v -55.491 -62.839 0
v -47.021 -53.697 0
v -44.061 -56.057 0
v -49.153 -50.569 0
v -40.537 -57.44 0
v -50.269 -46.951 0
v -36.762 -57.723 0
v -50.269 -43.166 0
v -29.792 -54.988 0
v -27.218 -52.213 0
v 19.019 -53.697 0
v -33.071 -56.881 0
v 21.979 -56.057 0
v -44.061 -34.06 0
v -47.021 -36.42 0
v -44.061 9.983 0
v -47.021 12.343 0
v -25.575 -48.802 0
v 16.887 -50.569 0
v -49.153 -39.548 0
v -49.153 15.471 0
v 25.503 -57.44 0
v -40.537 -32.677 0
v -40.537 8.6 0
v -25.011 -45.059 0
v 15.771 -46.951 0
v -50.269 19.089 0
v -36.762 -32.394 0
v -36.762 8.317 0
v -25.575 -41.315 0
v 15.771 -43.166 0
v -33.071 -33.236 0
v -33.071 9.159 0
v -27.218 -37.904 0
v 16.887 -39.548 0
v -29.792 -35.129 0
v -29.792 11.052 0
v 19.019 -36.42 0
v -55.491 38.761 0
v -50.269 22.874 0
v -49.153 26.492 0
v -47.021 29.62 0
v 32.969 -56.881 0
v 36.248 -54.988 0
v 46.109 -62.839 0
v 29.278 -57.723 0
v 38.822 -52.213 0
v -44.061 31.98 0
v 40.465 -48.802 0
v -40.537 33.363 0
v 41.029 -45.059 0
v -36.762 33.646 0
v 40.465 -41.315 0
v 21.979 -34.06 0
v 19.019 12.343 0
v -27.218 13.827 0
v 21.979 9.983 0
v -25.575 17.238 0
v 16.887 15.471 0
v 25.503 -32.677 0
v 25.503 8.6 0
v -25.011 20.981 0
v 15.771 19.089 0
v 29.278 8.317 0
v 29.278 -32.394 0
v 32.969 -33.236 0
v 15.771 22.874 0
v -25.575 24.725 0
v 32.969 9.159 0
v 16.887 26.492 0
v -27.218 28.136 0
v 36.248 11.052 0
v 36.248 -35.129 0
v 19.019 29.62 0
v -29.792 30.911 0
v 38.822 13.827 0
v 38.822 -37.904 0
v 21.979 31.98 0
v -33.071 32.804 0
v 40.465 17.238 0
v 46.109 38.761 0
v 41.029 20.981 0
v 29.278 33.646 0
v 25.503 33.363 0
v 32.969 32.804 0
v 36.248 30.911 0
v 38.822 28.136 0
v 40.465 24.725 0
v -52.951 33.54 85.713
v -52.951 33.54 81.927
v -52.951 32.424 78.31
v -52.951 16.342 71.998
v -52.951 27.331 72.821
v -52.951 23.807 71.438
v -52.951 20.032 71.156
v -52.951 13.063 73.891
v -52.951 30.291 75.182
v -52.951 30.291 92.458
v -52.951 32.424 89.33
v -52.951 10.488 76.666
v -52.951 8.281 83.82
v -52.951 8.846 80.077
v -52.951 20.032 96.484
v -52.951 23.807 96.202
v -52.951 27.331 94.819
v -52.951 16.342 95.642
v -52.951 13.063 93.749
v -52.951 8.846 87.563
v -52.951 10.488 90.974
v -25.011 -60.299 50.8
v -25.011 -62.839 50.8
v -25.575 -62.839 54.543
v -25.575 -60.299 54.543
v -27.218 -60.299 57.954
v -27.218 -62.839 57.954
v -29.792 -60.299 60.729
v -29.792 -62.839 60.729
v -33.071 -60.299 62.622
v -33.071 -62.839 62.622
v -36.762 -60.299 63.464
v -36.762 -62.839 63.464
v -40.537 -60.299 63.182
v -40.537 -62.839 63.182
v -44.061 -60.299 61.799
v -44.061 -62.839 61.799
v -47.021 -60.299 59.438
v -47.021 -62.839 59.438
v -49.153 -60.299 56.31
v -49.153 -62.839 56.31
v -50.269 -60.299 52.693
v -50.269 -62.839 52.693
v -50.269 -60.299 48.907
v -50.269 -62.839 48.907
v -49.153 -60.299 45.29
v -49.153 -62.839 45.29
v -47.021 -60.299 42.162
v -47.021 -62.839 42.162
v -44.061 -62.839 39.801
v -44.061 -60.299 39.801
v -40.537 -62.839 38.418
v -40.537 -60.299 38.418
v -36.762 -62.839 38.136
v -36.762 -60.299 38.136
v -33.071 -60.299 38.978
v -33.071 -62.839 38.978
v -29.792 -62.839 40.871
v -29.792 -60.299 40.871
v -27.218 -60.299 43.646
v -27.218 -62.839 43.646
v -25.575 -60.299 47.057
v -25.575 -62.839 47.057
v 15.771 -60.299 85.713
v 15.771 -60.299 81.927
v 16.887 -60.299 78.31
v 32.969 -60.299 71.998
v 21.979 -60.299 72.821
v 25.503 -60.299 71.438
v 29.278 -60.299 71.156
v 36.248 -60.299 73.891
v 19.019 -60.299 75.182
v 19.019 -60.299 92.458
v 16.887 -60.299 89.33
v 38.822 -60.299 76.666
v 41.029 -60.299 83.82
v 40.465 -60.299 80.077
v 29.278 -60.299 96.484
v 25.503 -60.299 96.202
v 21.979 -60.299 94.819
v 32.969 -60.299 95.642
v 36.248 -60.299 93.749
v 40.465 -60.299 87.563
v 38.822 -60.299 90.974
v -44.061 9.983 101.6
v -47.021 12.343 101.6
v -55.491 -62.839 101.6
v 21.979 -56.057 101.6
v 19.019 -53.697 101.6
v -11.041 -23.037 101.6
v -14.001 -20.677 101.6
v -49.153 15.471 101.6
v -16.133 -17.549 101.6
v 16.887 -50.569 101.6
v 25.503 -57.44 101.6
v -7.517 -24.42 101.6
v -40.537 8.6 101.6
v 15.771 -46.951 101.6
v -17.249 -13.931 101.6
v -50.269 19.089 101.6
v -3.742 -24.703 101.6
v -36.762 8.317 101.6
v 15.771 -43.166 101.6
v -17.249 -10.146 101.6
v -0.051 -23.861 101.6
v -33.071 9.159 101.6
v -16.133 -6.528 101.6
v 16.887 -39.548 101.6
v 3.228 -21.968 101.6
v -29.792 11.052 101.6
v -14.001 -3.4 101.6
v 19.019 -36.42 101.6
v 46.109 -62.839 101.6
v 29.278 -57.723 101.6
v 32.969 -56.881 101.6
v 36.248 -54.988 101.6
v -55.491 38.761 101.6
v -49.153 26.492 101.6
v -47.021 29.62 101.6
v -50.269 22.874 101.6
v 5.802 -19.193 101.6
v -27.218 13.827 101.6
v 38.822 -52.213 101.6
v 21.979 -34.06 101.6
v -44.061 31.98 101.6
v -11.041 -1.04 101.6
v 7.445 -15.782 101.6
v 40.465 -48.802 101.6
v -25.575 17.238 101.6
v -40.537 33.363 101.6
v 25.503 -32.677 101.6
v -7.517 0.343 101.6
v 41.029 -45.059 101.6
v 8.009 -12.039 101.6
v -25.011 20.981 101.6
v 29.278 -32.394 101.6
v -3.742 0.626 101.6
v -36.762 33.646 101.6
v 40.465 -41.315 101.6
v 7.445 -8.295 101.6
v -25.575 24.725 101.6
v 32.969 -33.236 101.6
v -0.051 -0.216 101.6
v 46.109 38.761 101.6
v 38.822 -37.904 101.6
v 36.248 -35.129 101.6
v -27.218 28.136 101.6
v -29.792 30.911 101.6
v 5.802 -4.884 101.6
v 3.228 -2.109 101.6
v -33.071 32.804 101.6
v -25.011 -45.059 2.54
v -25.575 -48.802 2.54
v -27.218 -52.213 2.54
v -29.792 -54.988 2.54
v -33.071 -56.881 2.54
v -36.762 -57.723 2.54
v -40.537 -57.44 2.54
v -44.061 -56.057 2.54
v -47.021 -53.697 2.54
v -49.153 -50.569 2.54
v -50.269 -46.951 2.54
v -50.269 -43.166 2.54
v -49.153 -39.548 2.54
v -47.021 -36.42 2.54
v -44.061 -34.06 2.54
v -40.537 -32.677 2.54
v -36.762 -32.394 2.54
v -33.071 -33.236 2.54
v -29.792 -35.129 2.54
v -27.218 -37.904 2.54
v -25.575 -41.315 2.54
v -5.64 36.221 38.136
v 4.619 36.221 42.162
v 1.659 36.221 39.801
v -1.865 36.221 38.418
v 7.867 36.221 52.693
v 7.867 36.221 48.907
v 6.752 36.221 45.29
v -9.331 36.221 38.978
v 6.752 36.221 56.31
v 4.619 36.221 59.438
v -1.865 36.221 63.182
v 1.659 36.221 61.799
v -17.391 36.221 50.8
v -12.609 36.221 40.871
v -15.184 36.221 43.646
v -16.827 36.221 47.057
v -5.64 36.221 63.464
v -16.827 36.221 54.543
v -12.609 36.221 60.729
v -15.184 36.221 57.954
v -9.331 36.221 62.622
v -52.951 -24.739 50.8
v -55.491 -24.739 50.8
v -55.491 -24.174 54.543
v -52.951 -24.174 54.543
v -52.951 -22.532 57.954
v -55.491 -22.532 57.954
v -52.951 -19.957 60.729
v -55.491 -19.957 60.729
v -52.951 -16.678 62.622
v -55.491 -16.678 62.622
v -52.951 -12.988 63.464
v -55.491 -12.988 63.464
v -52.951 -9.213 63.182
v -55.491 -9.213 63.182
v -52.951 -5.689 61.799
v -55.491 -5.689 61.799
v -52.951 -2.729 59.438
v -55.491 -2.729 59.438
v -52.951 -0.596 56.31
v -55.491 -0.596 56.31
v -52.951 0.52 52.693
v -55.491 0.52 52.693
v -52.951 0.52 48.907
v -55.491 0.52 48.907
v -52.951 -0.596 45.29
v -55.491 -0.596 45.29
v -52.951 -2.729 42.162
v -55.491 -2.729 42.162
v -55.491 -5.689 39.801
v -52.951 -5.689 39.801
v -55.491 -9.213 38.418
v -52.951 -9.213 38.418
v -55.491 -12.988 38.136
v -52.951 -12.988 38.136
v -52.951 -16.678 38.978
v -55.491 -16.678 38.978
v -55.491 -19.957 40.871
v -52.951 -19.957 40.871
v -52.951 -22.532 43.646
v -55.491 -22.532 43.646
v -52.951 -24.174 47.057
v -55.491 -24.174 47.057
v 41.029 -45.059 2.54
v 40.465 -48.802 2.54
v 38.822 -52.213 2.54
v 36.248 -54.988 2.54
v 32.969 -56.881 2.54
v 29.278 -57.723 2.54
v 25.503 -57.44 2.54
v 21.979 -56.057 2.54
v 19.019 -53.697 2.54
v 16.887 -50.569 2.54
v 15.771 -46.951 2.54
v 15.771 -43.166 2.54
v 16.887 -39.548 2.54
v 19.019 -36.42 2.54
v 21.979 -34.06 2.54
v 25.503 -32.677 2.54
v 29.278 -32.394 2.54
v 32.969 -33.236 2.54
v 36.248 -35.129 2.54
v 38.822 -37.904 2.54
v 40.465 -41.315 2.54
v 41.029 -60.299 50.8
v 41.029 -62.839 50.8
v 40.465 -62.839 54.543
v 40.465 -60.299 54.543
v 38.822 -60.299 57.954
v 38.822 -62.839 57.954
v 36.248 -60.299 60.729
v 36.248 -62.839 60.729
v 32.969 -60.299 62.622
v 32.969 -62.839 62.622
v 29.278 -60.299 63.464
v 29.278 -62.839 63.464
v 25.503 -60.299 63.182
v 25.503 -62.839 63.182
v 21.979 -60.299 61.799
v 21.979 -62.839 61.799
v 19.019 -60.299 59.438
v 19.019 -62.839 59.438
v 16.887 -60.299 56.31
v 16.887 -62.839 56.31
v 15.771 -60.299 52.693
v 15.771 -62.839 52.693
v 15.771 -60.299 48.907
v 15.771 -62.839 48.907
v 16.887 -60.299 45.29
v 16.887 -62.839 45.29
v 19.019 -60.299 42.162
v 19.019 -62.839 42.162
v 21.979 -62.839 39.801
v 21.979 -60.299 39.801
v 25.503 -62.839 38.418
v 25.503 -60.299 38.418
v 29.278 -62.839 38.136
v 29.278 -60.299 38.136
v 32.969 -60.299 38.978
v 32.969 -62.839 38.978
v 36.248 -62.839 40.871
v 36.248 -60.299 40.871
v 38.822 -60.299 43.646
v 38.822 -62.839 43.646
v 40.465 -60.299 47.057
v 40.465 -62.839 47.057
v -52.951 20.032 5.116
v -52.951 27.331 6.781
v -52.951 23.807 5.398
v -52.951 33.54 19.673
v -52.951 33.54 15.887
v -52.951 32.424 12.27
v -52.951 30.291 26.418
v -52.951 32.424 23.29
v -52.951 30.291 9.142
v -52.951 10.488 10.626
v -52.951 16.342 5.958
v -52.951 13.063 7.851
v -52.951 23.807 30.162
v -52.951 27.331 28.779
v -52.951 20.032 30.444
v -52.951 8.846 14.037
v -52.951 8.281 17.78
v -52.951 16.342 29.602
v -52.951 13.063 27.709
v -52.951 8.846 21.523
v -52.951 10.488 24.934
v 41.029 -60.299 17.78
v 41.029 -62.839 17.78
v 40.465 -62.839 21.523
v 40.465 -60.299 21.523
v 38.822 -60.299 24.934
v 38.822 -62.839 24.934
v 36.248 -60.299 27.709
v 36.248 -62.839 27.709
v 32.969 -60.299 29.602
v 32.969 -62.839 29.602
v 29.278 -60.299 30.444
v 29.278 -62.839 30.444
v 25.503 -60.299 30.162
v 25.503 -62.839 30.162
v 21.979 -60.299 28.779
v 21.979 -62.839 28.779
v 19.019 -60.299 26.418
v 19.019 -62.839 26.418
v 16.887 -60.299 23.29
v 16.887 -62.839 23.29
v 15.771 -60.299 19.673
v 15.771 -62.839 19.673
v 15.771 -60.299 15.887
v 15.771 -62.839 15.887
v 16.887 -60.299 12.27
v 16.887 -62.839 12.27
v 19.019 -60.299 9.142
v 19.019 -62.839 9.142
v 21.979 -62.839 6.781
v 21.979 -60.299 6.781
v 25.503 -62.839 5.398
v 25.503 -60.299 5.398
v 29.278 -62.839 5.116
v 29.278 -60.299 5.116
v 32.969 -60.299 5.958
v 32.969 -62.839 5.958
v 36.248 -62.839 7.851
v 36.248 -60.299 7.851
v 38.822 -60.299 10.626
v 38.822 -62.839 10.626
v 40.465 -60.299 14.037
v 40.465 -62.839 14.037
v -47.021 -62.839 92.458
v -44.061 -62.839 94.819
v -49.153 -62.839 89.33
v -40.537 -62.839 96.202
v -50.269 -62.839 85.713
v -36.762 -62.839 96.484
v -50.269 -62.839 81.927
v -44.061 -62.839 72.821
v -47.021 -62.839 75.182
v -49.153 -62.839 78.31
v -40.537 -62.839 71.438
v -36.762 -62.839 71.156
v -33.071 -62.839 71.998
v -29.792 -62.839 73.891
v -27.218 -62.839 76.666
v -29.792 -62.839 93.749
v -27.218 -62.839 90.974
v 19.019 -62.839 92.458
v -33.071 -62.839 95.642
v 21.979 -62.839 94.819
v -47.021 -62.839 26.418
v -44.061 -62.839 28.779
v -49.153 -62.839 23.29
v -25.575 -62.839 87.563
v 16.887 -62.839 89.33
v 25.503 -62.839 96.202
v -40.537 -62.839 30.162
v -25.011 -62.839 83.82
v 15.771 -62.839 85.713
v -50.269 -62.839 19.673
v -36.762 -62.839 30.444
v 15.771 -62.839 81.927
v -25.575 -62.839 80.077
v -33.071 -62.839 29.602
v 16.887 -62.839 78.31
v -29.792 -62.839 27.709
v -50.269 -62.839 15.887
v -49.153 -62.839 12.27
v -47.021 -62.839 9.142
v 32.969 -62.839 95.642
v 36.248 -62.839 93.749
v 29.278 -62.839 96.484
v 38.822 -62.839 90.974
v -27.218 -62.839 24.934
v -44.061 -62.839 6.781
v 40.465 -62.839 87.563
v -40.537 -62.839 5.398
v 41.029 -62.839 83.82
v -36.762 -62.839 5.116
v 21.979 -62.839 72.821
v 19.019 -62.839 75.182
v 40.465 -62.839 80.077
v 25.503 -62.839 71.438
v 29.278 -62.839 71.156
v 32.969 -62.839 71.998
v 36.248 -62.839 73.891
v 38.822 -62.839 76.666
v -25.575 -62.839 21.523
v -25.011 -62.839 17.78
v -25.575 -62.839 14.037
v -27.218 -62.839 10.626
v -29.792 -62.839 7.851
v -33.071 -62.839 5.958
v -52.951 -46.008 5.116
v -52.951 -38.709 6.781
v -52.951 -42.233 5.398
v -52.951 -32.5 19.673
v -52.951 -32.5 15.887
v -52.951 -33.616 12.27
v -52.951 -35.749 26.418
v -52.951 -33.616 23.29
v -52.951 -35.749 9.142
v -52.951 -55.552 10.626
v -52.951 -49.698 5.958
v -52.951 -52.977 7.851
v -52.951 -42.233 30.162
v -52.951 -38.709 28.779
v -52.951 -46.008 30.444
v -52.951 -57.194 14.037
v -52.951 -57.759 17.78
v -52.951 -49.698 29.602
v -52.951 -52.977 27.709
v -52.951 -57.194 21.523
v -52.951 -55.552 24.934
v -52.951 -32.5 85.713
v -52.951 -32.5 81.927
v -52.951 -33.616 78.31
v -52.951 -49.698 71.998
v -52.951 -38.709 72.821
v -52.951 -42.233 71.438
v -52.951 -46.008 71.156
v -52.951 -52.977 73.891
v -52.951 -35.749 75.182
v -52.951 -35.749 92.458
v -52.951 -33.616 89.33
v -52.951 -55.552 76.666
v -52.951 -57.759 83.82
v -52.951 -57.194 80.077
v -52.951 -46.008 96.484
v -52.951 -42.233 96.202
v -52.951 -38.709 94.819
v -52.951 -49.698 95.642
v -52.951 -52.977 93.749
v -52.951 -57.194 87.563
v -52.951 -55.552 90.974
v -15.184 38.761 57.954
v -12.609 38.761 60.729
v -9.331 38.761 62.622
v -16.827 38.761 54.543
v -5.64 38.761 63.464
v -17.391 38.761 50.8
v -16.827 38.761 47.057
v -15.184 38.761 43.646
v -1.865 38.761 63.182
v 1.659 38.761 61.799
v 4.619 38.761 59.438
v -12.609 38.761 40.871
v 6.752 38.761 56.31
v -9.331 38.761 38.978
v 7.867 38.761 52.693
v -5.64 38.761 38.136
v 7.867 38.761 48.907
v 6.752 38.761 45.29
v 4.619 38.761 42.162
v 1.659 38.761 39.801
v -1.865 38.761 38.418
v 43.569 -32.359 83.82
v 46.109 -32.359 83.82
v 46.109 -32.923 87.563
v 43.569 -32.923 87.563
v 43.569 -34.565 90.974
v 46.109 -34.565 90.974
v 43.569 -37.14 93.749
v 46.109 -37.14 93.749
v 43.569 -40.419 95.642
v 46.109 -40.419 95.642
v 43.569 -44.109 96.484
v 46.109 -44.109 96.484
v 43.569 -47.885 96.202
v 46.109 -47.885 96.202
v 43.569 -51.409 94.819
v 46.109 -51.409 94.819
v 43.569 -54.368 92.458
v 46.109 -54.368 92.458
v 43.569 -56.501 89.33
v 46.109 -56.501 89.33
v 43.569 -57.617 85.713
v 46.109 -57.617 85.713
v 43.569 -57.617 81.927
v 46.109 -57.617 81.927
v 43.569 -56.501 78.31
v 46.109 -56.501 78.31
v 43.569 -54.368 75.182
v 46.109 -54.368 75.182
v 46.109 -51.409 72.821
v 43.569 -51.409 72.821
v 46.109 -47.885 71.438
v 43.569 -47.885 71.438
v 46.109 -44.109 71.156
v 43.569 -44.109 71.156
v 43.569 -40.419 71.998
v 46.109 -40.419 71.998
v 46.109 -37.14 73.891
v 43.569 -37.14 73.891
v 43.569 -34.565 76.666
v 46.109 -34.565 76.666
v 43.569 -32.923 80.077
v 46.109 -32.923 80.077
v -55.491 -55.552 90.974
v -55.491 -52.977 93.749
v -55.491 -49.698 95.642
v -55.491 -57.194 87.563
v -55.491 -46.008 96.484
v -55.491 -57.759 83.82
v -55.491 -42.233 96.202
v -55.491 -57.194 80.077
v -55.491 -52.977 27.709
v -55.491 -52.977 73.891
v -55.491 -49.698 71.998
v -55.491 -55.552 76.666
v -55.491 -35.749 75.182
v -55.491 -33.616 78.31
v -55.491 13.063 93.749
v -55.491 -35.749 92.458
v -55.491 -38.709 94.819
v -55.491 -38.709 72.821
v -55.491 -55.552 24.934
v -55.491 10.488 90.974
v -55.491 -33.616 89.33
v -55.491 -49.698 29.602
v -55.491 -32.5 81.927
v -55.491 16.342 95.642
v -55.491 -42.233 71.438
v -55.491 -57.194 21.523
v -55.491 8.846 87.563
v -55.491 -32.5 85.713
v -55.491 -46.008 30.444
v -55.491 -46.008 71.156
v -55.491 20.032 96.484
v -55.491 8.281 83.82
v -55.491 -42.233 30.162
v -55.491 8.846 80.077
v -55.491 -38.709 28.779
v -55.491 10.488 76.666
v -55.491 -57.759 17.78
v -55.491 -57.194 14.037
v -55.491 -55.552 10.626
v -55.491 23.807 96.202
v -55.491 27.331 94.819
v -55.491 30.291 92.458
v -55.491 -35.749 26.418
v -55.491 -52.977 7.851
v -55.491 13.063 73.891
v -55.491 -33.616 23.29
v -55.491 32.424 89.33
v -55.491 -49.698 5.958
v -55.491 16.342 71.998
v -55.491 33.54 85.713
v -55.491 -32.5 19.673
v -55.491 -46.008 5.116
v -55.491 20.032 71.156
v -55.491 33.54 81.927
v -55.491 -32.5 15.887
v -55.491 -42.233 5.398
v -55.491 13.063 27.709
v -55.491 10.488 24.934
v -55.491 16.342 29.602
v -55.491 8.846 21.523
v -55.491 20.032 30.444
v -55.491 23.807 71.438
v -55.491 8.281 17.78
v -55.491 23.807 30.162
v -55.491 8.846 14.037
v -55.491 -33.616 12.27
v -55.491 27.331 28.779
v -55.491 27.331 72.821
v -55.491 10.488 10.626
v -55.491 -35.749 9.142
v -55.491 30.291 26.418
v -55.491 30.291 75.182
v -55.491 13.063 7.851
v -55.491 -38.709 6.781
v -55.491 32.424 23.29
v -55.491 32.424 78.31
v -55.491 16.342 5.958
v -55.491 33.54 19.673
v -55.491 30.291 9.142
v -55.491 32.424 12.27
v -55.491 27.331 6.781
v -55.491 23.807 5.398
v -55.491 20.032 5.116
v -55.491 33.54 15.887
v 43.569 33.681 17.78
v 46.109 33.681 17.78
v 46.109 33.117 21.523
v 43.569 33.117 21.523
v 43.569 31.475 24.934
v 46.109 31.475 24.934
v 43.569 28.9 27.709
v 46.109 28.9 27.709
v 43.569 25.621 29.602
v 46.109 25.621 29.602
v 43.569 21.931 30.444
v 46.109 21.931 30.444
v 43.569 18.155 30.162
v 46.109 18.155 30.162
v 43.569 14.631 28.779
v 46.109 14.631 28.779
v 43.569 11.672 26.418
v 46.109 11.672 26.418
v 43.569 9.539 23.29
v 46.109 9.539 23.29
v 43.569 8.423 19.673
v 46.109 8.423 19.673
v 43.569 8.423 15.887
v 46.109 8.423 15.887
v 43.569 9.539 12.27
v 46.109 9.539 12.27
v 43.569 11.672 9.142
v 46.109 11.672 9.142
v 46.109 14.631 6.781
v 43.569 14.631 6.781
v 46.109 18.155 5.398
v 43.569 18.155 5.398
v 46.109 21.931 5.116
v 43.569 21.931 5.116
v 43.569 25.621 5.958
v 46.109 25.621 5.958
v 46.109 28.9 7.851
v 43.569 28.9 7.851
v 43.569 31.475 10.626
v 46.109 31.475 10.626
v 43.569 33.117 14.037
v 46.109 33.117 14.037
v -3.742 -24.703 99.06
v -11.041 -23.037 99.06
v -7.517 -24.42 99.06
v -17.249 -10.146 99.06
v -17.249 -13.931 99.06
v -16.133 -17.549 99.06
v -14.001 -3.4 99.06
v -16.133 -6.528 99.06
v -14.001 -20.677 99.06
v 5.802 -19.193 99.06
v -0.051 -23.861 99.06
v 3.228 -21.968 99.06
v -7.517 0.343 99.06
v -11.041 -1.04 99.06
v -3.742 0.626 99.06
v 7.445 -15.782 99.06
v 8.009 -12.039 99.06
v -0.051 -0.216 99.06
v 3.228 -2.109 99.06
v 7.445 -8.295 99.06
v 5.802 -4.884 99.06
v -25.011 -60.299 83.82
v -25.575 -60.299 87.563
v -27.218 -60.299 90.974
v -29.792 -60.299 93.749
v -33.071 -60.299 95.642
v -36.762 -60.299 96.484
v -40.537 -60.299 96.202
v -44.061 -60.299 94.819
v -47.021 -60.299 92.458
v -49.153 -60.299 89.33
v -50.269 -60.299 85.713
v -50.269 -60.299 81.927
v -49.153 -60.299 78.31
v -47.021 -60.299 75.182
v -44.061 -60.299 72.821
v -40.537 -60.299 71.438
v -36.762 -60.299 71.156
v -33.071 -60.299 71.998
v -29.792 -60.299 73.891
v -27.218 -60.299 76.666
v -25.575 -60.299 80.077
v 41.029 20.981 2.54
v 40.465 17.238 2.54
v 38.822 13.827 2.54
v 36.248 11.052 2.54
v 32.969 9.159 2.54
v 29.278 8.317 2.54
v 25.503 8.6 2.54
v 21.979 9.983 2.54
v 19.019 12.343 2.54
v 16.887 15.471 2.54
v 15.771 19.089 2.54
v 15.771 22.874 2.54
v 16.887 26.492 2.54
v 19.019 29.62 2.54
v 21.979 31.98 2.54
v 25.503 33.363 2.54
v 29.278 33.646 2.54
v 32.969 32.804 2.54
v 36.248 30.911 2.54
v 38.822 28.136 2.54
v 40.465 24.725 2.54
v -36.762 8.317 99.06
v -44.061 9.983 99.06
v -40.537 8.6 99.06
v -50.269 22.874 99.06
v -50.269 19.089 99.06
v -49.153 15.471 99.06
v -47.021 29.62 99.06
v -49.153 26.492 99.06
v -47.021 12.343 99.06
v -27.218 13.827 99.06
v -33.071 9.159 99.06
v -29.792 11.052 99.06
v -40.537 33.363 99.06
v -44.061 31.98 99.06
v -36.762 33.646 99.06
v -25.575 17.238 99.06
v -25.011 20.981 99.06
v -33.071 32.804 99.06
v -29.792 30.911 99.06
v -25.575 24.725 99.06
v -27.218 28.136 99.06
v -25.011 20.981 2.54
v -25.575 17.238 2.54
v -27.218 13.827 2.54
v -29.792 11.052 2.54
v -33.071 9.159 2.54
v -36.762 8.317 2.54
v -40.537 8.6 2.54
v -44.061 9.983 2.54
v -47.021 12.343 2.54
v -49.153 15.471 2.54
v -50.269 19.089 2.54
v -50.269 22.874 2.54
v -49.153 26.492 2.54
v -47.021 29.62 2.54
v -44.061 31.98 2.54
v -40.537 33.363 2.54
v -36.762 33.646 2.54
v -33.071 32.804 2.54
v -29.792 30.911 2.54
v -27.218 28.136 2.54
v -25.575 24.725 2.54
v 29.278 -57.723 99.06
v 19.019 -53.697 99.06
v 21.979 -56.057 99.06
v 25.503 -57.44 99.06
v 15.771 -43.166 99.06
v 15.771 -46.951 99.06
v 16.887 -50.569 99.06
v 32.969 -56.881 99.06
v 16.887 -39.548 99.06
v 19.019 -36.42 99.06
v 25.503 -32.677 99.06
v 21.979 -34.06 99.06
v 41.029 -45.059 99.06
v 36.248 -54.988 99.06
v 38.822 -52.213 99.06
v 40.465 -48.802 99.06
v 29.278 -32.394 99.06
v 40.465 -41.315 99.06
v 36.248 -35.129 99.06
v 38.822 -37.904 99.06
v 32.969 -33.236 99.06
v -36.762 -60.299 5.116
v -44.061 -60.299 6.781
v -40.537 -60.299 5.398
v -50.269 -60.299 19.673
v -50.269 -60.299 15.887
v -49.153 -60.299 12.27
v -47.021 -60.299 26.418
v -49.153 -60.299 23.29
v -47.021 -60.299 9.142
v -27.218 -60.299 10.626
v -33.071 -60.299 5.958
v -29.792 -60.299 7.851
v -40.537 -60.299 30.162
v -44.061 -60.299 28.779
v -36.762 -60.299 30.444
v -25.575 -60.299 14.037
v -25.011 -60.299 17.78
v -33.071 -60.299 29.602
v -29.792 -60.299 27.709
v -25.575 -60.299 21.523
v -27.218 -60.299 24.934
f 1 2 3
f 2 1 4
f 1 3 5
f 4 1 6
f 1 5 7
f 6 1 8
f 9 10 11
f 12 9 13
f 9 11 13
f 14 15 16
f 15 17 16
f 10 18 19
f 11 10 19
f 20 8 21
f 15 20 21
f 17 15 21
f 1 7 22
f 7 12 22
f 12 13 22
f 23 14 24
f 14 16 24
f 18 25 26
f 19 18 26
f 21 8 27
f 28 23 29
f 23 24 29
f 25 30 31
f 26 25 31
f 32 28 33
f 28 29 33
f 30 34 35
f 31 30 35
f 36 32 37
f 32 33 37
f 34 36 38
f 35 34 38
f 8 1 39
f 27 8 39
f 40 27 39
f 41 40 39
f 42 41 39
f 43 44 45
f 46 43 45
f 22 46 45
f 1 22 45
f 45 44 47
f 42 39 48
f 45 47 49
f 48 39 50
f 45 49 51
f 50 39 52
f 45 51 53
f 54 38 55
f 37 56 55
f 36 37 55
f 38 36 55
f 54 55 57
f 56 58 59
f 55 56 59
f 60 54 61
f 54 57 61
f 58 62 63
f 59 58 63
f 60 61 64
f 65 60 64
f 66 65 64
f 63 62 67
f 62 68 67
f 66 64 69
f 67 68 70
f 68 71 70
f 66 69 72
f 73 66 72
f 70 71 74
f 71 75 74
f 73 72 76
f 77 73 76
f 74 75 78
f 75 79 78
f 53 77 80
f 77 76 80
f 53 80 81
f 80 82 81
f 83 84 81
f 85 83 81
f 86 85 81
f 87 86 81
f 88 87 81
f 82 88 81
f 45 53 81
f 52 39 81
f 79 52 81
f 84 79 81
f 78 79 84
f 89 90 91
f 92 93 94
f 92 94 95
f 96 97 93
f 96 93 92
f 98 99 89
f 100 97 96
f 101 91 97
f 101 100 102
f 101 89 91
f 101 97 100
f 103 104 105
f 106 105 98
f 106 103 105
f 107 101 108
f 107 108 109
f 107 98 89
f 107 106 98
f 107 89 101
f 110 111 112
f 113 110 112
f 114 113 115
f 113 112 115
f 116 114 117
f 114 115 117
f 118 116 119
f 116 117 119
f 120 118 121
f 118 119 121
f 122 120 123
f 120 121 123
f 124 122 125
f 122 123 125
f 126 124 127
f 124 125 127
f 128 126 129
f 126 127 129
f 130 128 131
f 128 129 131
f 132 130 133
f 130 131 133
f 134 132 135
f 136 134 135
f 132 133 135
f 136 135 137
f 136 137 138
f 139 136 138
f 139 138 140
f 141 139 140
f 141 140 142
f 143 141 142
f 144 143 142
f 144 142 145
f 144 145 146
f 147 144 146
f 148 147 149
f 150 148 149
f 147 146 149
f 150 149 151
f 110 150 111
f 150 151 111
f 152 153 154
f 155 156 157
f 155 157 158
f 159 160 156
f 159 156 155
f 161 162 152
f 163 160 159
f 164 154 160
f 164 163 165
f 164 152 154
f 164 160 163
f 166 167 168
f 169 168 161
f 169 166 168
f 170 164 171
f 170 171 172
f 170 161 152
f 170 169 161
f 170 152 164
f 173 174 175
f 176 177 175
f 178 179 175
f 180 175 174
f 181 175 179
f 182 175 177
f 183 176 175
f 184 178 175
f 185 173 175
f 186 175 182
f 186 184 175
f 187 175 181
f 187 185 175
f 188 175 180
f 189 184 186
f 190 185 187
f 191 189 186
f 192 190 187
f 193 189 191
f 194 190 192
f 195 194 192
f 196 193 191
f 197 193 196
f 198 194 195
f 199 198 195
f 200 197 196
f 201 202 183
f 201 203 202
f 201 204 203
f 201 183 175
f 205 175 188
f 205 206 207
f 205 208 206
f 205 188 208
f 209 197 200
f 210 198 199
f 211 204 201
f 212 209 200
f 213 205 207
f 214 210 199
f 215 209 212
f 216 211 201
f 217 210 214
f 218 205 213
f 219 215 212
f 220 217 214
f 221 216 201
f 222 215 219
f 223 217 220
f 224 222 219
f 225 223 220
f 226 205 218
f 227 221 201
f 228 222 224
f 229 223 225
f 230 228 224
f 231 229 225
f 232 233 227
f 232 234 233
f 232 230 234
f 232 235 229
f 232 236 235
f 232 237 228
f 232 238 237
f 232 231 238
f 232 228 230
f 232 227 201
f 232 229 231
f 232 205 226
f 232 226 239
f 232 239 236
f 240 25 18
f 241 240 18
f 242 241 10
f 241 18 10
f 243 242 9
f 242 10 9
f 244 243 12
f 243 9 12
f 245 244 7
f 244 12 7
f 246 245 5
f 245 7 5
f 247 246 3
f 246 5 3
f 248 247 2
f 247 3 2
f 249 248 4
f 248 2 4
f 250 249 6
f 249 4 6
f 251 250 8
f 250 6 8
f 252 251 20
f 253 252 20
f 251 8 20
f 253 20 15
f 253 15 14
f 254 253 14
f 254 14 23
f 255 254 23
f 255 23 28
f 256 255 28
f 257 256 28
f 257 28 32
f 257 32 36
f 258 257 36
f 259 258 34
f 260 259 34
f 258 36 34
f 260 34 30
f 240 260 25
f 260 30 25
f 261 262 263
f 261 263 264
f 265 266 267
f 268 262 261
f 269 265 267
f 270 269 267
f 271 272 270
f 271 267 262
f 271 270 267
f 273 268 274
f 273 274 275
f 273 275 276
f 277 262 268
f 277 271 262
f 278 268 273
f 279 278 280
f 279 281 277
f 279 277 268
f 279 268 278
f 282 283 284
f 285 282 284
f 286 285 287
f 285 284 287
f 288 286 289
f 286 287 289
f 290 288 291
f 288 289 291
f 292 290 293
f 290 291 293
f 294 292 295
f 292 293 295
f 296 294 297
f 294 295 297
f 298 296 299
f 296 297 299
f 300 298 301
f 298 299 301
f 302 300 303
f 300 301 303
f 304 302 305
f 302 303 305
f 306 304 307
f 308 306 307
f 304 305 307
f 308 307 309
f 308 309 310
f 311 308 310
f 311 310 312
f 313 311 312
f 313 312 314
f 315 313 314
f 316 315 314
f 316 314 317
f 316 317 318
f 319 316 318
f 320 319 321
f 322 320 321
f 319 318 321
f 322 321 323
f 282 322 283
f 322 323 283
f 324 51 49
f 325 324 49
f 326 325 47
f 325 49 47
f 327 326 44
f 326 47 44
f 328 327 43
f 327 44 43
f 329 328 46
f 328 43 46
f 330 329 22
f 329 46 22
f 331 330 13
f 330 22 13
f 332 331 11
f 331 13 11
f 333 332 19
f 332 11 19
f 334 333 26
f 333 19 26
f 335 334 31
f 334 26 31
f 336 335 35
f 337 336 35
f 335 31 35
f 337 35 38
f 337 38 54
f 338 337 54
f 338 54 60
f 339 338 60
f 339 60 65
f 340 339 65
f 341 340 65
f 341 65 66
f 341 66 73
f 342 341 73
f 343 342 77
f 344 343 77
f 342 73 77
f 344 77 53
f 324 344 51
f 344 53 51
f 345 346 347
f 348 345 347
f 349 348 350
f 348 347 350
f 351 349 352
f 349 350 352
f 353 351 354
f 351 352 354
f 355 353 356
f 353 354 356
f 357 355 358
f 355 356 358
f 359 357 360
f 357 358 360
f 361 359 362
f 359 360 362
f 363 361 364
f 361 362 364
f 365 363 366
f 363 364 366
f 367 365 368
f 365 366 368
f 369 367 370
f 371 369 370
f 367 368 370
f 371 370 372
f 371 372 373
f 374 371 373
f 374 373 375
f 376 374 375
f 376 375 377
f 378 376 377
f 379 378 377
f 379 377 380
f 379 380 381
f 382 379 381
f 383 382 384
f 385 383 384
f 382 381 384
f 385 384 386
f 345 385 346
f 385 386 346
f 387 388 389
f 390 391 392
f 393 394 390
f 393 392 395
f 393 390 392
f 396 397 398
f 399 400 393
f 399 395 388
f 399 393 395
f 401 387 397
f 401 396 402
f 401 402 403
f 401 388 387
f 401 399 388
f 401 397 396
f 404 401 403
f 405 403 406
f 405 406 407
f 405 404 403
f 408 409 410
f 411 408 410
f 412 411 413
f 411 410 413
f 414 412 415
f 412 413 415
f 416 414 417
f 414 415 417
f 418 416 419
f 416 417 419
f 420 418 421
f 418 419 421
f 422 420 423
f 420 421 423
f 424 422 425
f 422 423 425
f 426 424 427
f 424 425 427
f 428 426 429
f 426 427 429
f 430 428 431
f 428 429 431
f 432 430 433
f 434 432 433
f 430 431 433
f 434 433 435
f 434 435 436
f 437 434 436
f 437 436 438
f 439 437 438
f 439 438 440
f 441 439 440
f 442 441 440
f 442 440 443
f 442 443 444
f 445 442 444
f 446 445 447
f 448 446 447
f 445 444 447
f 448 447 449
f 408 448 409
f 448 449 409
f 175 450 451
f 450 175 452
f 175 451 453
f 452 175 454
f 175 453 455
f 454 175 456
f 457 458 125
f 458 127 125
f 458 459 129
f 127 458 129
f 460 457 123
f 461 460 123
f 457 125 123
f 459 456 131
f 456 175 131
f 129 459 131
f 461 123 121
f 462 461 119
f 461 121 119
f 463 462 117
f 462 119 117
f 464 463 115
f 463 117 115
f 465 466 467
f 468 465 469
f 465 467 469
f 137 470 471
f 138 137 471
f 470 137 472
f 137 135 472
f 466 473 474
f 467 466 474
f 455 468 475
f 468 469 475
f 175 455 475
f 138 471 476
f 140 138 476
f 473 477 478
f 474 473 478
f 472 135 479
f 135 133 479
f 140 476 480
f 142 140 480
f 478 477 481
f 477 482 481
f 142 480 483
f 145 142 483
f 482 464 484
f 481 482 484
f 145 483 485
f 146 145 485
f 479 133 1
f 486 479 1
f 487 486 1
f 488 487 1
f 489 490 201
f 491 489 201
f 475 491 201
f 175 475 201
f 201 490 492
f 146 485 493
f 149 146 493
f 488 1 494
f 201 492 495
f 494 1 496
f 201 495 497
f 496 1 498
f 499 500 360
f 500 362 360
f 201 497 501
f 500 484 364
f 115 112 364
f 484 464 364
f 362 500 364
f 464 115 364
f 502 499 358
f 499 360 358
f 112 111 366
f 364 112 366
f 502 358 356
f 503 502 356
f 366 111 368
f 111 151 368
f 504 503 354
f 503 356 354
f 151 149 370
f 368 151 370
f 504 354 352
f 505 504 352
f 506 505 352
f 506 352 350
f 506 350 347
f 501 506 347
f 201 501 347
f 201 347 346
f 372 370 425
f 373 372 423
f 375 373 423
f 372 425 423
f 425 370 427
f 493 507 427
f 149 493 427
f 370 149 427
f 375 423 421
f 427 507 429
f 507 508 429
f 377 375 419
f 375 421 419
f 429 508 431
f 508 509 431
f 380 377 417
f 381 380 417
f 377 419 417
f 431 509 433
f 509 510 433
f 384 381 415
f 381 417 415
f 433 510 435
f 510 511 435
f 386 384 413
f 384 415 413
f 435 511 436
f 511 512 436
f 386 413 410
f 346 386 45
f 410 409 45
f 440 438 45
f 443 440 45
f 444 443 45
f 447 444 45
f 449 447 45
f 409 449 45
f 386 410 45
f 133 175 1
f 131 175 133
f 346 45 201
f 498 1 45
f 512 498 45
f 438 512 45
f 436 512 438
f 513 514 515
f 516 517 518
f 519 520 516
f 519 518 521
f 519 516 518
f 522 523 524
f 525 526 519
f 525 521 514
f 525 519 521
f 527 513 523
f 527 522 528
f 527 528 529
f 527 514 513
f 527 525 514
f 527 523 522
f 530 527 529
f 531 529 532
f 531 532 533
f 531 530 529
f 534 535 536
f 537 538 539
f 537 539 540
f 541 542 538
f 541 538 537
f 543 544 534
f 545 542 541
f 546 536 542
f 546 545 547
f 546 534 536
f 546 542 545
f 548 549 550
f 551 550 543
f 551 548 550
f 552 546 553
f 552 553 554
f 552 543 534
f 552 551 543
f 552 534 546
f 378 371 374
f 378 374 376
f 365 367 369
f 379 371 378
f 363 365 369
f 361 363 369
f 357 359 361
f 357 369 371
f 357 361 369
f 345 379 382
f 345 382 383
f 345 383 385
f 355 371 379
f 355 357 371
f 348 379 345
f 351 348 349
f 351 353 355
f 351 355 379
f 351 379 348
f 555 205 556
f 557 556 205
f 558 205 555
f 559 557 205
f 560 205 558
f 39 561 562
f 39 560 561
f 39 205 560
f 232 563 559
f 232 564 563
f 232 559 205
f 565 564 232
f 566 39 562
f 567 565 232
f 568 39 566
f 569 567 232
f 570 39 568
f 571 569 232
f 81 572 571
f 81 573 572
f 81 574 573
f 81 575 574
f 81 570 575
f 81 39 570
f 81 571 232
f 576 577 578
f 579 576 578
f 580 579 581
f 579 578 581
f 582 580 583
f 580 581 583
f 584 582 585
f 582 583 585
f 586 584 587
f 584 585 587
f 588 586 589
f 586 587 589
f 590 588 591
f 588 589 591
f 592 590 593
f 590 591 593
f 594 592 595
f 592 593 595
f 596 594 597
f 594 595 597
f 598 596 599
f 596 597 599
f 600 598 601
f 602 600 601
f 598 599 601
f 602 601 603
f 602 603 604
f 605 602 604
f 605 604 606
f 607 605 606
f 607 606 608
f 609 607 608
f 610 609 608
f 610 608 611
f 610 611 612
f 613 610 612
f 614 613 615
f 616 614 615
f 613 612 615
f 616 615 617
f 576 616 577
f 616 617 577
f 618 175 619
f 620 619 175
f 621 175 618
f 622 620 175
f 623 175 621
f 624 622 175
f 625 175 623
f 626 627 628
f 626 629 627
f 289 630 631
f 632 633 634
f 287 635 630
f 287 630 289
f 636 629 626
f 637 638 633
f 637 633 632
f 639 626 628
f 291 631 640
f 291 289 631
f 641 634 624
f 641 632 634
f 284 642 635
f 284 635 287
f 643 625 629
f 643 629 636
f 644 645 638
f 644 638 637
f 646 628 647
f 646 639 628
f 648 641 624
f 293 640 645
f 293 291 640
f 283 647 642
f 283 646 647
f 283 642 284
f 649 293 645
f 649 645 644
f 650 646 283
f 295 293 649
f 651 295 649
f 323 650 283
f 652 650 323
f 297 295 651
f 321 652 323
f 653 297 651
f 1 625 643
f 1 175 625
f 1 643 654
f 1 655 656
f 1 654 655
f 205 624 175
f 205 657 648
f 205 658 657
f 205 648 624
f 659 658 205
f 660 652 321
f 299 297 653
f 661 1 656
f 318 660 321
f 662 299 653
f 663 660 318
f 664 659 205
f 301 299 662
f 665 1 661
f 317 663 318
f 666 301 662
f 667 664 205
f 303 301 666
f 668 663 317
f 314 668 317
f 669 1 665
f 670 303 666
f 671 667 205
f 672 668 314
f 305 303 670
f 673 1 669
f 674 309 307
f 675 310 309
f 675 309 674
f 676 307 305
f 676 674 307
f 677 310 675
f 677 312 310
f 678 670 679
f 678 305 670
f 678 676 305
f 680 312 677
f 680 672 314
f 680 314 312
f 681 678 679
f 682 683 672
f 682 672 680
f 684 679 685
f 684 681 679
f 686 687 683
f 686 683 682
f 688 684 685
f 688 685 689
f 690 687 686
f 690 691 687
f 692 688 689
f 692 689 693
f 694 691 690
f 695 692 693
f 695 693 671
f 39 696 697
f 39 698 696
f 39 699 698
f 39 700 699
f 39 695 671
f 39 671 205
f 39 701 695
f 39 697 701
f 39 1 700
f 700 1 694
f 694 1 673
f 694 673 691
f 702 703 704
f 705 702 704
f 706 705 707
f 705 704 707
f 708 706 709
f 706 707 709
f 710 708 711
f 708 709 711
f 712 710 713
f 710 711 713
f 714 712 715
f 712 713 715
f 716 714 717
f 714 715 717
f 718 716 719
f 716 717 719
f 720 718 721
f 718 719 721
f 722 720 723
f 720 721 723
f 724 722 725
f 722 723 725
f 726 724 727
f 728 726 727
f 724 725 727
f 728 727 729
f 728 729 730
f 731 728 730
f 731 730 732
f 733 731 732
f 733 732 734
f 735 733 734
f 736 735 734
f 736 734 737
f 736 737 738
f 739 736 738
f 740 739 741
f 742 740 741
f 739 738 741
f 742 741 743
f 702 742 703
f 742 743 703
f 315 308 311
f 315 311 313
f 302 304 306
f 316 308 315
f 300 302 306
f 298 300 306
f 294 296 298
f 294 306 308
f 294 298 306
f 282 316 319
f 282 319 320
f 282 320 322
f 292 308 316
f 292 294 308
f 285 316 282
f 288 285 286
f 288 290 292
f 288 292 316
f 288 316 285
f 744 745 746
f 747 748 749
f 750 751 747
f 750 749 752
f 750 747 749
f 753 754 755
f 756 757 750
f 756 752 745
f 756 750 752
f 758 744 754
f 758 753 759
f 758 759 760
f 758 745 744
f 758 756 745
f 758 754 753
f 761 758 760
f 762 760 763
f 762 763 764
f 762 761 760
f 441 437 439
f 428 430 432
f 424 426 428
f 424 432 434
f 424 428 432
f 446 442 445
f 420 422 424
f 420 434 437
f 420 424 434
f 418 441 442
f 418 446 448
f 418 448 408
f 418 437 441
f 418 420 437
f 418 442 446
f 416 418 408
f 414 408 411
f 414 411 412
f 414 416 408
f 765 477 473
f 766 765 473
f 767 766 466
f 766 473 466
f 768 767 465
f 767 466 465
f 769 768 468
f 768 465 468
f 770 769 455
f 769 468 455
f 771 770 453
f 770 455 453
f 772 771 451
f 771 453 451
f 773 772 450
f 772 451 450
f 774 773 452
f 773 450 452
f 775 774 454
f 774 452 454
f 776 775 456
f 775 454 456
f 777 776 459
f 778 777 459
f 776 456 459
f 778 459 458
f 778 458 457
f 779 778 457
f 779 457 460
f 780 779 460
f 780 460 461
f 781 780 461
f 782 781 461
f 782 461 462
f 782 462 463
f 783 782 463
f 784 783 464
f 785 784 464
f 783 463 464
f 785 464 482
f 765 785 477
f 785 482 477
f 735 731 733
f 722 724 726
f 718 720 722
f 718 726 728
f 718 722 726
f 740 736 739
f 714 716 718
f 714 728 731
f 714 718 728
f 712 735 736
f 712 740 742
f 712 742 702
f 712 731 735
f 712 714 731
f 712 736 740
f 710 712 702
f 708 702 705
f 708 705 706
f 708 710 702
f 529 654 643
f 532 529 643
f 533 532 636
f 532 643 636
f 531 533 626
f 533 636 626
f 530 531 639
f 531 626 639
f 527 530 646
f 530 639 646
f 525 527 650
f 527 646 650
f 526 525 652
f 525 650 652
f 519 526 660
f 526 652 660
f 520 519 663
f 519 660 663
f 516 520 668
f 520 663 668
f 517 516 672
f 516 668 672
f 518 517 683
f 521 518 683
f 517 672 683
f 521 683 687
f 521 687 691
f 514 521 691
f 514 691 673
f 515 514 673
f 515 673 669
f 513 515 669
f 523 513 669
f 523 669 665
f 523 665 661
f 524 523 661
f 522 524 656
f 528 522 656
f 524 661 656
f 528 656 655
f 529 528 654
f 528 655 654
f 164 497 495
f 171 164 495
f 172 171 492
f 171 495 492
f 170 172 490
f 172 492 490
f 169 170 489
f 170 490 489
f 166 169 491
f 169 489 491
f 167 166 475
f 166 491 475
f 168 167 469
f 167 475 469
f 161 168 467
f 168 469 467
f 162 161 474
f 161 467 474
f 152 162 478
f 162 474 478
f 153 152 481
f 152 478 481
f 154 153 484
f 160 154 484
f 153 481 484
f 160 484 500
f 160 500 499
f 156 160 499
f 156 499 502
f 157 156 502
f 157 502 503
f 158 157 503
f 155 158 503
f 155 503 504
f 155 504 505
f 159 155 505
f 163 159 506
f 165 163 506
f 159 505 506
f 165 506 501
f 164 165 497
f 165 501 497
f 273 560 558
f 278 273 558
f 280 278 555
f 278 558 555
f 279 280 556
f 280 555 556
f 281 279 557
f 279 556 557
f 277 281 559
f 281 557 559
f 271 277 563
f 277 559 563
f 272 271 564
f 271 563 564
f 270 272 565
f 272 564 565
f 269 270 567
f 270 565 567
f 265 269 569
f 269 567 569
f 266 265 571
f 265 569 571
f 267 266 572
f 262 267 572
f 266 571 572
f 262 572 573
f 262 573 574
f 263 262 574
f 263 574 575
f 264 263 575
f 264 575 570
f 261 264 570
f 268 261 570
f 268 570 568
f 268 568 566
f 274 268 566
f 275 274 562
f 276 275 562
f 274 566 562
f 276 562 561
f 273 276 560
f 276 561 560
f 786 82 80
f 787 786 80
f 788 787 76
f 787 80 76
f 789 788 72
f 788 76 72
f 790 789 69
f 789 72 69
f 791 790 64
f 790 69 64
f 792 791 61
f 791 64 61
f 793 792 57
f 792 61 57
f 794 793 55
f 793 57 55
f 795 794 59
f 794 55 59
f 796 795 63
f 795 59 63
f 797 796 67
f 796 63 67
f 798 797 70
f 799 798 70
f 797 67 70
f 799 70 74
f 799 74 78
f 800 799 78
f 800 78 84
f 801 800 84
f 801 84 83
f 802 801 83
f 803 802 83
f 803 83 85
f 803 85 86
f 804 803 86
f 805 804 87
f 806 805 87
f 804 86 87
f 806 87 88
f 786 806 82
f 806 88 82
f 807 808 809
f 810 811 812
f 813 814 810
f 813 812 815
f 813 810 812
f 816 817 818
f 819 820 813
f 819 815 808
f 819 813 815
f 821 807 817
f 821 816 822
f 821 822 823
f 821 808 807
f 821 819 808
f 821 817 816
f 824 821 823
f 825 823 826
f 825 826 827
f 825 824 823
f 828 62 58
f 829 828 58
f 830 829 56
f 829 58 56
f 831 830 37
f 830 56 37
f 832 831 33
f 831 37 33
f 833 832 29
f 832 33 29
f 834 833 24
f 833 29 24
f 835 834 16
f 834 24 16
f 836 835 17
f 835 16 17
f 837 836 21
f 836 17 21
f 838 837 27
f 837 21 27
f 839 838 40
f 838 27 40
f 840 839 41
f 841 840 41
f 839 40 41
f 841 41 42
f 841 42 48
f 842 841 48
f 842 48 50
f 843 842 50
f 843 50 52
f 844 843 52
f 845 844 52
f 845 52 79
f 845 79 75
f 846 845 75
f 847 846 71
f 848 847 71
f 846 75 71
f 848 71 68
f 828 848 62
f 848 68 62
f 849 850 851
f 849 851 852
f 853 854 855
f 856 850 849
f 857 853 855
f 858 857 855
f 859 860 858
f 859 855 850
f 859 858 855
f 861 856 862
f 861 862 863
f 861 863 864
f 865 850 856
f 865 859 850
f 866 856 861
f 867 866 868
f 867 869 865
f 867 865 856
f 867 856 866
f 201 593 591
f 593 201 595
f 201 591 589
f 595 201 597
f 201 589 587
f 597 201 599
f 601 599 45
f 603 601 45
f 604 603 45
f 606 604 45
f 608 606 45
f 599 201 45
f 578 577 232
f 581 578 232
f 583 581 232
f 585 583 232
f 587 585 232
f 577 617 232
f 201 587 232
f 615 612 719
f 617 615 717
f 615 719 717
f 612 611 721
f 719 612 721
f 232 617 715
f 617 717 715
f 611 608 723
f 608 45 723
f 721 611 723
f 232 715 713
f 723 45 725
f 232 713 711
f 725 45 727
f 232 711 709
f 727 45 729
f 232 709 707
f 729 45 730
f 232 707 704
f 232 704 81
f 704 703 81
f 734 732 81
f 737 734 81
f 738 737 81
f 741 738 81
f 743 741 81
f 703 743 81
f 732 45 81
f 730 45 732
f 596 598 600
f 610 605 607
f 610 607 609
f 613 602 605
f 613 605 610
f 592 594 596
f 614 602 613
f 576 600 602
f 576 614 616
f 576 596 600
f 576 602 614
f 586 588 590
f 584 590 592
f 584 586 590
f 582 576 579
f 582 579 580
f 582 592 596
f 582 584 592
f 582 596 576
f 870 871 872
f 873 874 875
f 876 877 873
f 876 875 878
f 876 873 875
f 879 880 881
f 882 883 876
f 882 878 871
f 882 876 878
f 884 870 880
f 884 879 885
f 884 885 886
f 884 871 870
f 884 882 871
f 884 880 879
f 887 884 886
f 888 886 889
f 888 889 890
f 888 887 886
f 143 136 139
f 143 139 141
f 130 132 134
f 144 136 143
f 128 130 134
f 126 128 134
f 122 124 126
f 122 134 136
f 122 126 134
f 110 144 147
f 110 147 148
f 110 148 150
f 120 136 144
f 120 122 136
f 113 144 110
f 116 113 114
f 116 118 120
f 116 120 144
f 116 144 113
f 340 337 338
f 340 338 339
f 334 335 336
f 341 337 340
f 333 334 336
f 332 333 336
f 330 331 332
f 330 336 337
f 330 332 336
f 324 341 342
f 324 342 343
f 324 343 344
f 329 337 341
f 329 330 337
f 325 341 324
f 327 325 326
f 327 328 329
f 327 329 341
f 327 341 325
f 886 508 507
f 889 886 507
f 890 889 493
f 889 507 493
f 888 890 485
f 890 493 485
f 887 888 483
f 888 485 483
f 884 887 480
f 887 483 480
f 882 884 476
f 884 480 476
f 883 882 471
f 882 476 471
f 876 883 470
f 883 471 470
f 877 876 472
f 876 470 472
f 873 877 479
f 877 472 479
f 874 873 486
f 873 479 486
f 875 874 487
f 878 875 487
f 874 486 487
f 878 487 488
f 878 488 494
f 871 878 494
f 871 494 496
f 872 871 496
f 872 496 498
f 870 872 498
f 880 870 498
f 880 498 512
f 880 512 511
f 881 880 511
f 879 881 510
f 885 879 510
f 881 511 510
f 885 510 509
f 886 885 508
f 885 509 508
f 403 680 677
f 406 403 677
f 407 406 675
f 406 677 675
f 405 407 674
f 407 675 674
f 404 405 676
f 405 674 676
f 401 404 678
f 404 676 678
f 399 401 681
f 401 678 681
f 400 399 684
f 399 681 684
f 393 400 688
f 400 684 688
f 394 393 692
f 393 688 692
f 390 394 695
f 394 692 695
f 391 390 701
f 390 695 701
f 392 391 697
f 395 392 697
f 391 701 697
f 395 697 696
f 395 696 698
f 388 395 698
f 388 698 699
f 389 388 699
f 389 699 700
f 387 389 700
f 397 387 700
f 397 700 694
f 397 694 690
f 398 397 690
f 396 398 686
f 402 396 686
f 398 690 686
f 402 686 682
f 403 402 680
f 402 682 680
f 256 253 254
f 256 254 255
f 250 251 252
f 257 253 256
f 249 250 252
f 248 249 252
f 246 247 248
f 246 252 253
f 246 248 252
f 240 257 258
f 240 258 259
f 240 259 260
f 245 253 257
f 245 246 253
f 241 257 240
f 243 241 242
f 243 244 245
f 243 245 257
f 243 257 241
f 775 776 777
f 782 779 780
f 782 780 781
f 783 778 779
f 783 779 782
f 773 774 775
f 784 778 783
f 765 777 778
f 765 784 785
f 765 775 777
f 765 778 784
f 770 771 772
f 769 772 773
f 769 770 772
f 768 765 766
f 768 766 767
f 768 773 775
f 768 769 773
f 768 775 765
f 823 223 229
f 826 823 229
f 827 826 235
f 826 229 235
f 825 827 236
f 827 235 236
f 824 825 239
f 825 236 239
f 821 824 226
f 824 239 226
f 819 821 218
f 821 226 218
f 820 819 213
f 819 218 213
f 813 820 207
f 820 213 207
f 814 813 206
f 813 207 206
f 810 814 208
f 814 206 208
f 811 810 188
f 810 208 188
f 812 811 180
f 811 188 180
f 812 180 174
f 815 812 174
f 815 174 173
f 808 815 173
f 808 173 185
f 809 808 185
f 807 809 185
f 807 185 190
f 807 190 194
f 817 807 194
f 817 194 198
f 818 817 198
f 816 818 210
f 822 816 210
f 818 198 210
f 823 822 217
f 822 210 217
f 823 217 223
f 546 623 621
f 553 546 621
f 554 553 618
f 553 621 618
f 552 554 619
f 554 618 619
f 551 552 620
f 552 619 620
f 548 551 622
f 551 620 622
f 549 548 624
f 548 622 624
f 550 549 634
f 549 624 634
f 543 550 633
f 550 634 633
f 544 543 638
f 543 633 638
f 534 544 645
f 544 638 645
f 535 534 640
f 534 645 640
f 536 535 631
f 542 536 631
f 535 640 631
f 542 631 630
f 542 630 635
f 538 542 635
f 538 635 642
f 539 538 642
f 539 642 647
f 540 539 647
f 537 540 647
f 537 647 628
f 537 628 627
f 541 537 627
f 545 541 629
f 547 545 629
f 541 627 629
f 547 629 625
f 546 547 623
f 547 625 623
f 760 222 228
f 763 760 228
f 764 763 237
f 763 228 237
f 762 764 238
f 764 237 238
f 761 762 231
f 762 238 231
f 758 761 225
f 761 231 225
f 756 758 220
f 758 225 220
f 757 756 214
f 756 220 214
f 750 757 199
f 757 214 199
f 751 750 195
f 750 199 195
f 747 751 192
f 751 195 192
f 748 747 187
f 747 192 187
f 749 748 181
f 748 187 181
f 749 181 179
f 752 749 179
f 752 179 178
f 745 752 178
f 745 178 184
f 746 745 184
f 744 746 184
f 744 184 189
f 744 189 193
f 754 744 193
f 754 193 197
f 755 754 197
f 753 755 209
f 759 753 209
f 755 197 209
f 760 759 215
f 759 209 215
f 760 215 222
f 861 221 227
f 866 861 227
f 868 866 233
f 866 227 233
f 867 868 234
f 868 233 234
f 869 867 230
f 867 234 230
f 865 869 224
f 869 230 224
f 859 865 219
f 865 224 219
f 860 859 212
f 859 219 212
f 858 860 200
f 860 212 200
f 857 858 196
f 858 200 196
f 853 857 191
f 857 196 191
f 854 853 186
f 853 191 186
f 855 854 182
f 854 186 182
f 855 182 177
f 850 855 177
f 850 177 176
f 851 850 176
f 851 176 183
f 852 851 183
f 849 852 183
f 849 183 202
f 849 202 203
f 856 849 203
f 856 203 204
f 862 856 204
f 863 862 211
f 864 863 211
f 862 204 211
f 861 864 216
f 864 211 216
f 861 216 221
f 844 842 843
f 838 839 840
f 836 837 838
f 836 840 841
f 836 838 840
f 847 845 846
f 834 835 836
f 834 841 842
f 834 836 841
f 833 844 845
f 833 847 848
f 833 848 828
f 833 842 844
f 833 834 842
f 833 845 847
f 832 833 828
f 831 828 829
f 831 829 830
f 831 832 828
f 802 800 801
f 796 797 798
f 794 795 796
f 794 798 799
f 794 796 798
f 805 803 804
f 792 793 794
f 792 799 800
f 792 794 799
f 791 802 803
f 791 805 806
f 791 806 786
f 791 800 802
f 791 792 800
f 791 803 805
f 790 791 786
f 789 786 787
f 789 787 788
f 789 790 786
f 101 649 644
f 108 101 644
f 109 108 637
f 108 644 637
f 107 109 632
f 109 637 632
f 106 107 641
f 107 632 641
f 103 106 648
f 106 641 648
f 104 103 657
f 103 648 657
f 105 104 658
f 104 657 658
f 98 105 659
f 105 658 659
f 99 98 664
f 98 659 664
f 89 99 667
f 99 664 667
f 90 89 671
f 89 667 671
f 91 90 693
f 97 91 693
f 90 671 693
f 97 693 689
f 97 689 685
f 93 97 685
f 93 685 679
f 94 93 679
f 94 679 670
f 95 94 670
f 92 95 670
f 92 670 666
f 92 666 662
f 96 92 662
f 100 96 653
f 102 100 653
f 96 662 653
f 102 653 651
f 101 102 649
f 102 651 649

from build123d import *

# Parameters (mm, degrees)
F0_W      = 101.6
F0_H      = 101.6
F1_DEPTH  = 101.6
F2_R      = 12.7
F3_DEPTH  = 2.54
F4_R      = 12.7
F5_DEPTH  = 2.54
F6_R      = 12.7
F7_DEPTH  = 2.54
F8_R      = 12.7
F9_DEPTH  = 2.54
F10_R     = 12.7
F11_DEPTH = 2.54
F12_R     = 12.7
F13_DEPTH = 2.54


with BuildPart() as f1:
    # F0 (on Top) → F1 (new body)
    with BuildSketch(Plane.XY):
        with Locations((-4.690753, -12.038526)):
            Rectangle(F0_W, F0_H)
    extrude(amount=F1_DEPTH)

    # F2 (on face) → F3 (cut)
    with BuildSketch(Plane.XZ.offset(62.838526)):
        with Locations((-37.710753, 17.78)):
            Circle(F2_R)
        with Locations((-37.710753, 50.8)):
            Circle(F2_R)
        with Locations((-37.710753, 83.82)):
            Circle(F2_R)
        with Locations((28.329247, 17.78)):
            Circle(F2_R)
        with Locations((28.329247, 50.8)):
            Circle(F2_R)
        with Locations((28.329247, 83.82)):
            Circle(F2_R)
    extrude(amount=-F3_DEPTH, mode=Mode.SUBTRACT)

    # F4 (on face) → F5 (cut)
    with BuildSketch(Plane(origin=(0, 38.761474, 0), x_dir=(-1, 0, 0), z_dir=(0, 1, 0))):
        with Locations((4.690753, 50.8)):
            Circle(F4_R)
    extrude(amount=-F5_DEPTH, mode=Mode.SUBTRACT)

    # F6 (on face) → F7 (cut)
    with BuildSketch(Plane(origin=(-55.490753, 0, 0), x_dir=(0, -1, 0), z_dir=(-1, 0, 0))):
        with Locations((-20.981474, 83.82)):
            Circle(F6_R)
        with Locations((12.038526, 50.8)):
            Circle(F6_R)
        with Locations((-20.981474, 17.78)):
            Circle(F6_R)
        with Locations((45.058526, 83.82)):
            Circle(F6_R)
        with Locations((45.058526, 17.78)):
            Circle(F6_R)
    extrude(amount=-F7_DEPTH, mode=Mode.SUBTRACT)

    # F8 (on face) → F9 (cut)
    with BuildSketch(Plane.YZ.offset(46.109247)):
        with Locations((-45.058526, 83.82)):
            Circle(F8_R)
        with Locations((20.981474, 17.78)):
            Circle(F8_R)
    extrude(amount=-F9_DEPTH, mode=Mode.SUBTRACT)

    # F10 (on face) → F11 (cut)
    with BuildSketch(Plane.XY.offset(101.6)):
        with Locations((-37.710753, 20.981474)):
            Circle(F10_R)
        with Locations((-4.690753, -12.038526)):
            Circle(F10_R)
        with Locations((28.329247, -45.058526)):
            Circle(F10_R)
    extrude(amount=-F11_DEPTH, mode=Mode.SUBTRACT)

    # F12 (on face) → F13 (cut)
    with BuildSketch(Plane(origin=(0, 0, 0), x_dir=(1, 0, 0), z_dir=(0, 0, -1))):
        with Locations((-37.710753, 45.058526)):
            Circle(F12_R)
        with Locations((-37.710753, -20.981474)):
            Circle(F12_R)
        with Locations((28.329247, 45.058526)):
            Circle(F12_R)
        with Locations((28.329247, -20.981474)):
            Circle(F12_R)
    extrude(amount=-F13_DEPTH, mode=Mode.SUBTRACT)


solid = f1.part
